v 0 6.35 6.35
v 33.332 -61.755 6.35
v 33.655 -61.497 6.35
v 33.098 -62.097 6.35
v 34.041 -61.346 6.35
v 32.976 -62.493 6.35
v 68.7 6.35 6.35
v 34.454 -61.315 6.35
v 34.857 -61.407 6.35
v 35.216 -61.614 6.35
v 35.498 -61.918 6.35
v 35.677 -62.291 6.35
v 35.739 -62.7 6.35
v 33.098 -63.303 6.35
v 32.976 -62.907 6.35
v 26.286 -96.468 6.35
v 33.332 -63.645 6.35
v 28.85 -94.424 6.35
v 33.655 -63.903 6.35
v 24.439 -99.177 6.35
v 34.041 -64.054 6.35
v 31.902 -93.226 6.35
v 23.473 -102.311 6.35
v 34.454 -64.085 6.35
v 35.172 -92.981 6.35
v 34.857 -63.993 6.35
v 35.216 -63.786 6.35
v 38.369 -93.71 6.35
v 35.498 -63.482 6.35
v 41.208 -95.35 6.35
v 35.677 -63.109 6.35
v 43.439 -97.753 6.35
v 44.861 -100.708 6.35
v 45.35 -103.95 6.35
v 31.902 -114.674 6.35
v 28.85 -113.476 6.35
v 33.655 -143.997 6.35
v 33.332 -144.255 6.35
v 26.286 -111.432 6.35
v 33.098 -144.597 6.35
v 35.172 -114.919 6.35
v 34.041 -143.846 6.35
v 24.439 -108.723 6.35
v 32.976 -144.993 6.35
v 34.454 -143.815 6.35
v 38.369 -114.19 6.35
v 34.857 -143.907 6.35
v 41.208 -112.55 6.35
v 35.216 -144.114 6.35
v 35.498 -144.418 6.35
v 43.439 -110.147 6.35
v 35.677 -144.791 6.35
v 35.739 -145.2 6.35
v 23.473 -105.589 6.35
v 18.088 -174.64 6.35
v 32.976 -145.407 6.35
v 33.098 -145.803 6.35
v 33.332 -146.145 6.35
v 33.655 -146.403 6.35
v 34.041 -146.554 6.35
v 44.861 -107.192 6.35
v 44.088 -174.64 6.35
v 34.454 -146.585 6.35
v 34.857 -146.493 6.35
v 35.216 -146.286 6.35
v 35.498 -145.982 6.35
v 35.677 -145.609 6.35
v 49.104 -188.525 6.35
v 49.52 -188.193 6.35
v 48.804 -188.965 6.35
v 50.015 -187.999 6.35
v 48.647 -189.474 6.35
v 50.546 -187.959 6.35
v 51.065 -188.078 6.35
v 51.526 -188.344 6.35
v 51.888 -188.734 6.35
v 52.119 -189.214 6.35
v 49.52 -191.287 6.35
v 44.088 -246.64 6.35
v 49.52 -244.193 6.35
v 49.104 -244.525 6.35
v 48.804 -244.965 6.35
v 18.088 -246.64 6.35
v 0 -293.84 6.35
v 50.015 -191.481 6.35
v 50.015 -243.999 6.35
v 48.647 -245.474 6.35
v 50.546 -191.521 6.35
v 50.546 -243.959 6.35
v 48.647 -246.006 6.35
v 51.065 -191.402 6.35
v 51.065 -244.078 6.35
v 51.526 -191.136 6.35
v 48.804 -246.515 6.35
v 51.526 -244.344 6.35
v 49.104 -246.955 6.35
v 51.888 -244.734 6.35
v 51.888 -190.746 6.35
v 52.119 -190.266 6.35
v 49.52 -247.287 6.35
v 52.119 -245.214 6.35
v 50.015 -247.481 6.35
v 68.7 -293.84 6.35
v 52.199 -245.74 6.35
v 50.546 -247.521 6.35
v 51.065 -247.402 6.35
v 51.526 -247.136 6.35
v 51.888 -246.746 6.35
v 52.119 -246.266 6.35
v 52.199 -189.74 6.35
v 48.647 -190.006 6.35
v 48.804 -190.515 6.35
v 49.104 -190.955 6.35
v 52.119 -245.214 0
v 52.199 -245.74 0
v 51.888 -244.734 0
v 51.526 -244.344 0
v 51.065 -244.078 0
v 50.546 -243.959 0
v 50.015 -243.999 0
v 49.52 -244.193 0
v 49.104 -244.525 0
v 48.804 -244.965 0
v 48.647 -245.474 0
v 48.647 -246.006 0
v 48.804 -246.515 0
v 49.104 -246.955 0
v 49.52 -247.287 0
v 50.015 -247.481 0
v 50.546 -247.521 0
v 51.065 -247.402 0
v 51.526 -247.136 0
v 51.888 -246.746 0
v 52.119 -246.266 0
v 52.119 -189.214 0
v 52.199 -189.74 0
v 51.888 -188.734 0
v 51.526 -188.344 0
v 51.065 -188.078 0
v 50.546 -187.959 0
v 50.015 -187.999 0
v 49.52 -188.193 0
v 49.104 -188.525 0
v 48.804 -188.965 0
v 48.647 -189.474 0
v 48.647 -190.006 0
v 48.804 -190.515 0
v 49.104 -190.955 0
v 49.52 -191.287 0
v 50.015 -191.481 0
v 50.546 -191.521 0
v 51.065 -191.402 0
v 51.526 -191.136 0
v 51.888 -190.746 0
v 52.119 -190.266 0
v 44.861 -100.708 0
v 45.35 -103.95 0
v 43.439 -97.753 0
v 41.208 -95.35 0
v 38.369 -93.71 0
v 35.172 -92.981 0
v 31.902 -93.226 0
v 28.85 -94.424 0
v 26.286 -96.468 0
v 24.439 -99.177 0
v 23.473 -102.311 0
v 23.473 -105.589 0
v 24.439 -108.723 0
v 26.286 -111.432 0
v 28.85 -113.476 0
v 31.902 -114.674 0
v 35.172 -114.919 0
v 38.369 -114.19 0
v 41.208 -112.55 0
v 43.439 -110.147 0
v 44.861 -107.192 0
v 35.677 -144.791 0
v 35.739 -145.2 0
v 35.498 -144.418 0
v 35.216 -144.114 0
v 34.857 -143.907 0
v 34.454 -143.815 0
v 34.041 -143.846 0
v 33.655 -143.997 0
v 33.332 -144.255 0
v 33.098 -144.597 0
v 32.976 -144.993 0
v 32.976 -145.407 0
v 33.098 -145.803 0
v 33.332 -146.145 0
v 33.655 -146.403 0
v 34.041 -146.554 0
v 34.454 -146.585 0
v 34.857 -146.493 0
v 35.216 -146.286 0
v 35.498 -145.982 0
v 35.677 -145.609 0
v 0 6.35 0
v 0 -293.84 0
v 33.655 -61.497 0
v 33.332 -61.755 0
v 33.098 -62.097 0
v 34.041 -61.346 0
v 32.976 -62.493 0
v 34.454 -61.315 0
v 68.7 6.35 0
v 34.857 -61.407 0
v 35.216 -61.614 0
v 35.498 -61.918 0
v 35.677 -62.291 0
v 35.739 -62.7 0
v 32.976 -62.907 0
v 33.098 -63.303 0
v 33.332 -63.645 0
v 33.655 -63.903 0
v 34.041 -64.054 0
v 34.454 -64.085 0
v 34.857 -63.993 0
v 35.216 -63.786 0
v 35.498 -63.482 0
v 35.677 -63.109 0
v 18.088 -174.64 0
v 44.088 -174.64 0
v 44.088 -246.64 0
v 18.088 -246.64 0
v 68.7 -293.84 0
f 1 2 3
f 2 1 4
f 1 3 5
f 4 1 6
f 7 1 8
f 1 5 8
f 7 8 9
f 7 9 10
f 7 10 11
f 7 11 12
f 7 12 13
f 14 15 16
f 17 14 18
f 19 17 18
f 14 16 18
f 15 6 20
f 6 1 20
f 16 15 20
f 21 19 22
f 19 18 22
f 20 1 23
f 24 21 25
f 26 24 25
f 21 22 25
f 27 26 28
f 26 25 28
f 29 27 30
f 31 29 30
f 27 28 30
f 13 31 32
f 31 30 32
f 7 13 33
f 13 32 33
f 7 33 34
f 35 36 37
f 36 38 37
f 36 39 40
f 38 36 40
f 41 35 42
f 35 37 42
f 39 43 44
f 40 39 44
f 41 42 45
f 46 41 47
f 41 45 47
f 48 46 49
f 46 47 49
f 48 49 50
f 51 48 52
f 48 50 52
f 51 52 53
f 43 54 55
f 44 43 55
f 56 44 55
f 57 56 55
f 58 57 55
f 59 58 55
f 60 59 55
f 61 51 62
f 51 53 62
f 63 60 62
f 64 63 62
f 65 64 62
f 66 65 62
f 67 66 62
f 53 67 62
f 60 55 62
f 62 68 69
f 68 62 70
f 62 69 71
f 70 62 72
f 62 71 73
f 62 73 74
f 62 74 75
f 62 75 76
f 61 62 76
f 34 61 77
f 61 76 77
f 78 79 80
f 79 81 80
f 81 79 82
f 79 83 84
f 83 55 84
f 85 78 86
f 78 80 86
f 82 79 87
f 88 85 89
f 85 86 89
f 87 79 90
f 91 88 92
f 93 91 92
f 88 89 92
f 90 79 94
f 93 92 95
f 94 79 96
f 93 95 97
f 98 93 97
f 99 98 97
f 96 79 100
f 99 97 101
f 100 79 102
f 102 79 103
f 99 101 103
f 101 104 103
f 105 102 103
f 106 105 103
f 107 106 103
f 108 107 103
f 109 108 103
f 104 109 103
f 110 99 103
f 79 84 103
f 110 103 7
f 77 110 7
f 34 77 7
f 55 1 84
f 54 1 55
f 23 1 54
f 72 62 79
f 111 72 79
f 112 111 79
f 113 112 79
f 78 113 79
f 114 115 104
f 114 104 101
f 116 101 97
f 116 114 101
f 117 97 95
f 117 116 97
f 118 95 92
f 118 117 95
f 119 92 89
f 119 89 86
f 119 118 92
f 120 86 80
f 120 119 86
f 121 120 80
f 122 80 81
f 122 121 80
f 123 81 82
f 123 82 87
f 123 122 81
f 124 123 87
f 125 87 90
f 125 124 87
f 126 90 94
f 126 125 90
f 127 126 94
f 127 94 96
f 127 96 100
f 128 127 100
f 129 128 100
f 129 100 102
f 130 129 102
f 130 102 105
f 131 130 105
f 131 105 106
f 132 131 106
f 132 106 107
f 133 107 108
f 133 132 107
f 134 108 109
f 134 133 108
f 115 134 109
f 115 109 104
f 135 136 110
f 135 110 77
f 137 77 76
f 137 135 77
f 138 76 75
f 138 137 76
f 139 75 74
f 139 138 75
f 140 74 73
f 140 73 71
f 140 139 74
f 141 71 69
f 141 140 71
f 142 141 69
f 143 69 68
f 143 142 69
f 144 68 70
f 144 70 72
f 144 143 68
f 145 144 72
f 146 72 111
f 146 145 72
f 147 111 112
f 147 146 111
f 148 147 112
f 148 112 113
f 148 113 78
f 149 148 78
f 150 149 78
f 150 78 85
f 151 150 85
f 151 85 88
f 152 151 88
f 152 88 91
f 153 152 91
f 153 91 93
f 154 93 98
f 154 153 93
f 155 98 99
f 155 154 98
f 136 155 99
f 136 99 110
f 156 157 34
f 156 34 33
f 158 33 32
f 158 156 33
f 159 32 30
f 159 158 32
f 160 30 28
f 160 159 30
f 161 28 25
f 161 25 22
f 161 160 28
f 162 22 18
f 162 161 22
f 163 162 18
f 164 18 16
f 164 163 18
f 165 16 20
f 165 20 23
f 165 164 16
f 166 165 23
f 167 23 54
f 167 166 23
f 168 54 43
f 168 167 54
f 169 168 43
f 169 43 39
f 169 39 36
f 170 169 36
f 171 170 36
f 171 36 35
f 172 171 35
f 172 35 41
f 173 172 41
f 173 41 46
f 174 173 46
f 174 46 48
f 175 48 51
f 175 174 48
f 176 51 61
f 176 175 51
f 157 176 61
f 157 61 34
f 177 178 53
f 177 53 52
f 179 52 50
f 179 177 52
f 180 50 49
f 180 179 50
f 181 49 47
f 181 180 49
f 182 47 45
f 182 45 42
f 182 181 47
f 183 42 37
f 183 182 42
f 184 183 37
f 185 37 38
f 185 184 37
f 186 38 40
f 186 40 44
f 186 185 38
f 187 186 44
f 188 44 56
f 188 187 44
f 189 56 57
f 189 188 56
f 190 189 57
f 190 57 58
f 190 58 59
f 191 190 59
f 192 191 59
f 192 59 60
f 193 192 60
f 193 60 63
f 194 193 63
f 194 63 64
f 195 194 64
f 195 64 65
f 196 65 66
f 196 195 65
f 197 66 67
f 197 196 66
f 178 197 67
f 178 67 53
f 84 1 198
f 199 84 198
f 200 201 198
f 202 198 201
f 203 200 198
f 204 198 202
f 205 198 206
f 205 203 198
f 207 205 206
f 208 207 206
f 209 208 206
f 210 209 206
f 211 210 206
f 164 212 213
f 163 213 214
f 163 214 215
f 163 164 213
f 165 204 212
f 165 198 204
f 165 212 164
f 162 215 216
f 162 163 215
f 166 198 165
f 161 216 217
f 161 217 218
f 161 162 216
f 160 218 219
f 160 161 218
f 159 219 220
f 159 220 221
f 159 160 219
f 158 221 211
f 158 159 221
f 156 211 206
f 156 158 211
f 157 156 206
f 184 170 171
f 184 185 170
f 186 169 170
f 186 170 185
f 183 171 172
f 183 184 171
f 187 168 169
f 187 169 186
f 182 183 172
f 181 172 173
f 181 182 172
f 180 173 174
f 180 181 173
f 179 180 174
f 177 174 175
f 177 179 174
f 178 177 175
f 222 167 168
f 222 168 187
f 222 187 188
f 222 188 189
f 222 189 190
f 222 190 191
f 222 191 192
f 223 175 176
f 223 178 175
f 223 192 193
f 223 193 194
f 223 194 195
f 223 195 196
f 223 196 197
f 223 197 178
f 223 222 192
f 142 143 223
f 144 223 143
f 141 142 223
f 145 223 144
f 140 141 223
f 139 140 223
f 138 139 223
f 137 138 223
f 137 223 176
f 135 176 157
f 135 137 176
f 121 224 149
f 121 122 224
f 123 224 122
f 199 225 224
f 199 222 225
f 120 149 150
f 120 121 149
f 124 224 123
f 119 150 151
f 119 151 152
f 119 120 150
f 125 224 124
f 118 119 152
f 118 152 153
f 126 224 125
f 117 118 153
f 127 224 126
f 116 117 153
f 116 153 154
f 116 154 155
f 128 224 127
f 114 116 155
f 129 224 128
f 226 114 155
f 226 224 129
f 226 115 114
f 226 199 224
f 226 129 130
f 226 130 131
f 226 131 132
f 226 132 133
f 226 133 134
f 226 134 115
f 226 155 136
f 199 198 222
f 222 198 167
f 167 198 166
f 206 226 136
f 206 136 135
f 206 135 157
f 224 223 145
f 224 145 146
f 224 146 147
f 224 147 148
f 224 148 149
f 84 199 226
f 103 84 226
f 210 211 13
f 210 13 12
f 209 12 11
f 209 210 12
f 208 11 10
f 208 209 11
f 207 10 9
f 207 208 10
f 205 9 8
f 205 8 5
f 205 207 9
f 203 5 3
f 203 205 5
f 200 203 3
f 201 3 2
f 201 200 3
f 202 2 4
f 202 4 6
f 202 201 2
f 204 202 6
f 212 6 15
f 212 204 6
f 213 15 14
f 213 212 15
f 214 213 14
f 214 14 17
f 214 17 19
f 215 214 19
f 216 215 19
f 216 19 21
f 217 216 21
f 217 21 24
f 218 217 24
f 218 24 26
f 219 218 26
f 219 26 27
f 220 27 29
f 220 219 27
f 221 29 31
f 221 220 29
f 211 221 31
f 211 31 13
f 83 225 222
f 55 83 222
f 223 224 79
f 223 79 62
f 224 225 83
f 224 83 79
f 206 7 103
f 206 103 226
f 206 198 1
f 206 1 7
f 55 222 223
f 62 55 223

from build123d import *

# Parameters (mm, degrees)
SKETCH1_W           = 68.7
SKETCH1_H           = 293.84
SKETCH1_R           = 1.7859375
SKETCH1_R_2         = 1.3890625
SKETCH1_R_3         = 11
SKETCH1_W_2         = 26
SKETCH1_H_2         = 72
BOSS_EXTRUDE1_DEPTH = 6.35
SKETCH2_W           = 68.7
SKETCH2_H           = 6.35
BOSS_EXTRUDE2_DEPTH = 6.35


with BuildPart() as part:
    # Sketch1 → Boss-Extrude1 (new body)
    with BuildSketch(Plane.XY):
        with Locations((34.35, -146.92)):
            Rectangle(SKETCH1_W, SKETCH1_H)
        with Locations((50.4128, -189.74)):
            Circle(SKETCH1_R, mode=Mode.SUBTRACT)
        with Locations((50.4128, -245.74)):
            Circle(SKETCH1_R, mode=Mode.SUBTRACT)
        with Locations((34.35, -145.2)):
            Circle(SKETCH1_R_2, mode=Mode.SUBTRACT)
        with Locations((34.35, -103.95)):
            Circle(SKETCH1_R_3, mode=Mode.SUBTRACT)
        with Locations((34.35, -62.7)):
            Circle(SKETCH1_R_2, mode=Mode.SUBTRACT)
        with Locations((31.0878, -210.64)):
            Rectangle(SKETCH1_W_2, SKETCH1_H_2, mode=Mode.SUBTRACT)
    extrude(amount=BOSS_EXTRUDE1_DEPTH)

    # Sketch2 → Boss-Extrude2 (add)
    with BuildSketch(Plane(origin=(0, 0, 0), x_dir=(1, 0, 0), z_dir=(0, 1, 0))):
        with Locations((34.35, -3.175)):
            Rectangle(SKETCH2_W, SKETCH2_H)
    extrude(amount=BOSS_EXTRUDE2_DEPTH)


solid = part.part
